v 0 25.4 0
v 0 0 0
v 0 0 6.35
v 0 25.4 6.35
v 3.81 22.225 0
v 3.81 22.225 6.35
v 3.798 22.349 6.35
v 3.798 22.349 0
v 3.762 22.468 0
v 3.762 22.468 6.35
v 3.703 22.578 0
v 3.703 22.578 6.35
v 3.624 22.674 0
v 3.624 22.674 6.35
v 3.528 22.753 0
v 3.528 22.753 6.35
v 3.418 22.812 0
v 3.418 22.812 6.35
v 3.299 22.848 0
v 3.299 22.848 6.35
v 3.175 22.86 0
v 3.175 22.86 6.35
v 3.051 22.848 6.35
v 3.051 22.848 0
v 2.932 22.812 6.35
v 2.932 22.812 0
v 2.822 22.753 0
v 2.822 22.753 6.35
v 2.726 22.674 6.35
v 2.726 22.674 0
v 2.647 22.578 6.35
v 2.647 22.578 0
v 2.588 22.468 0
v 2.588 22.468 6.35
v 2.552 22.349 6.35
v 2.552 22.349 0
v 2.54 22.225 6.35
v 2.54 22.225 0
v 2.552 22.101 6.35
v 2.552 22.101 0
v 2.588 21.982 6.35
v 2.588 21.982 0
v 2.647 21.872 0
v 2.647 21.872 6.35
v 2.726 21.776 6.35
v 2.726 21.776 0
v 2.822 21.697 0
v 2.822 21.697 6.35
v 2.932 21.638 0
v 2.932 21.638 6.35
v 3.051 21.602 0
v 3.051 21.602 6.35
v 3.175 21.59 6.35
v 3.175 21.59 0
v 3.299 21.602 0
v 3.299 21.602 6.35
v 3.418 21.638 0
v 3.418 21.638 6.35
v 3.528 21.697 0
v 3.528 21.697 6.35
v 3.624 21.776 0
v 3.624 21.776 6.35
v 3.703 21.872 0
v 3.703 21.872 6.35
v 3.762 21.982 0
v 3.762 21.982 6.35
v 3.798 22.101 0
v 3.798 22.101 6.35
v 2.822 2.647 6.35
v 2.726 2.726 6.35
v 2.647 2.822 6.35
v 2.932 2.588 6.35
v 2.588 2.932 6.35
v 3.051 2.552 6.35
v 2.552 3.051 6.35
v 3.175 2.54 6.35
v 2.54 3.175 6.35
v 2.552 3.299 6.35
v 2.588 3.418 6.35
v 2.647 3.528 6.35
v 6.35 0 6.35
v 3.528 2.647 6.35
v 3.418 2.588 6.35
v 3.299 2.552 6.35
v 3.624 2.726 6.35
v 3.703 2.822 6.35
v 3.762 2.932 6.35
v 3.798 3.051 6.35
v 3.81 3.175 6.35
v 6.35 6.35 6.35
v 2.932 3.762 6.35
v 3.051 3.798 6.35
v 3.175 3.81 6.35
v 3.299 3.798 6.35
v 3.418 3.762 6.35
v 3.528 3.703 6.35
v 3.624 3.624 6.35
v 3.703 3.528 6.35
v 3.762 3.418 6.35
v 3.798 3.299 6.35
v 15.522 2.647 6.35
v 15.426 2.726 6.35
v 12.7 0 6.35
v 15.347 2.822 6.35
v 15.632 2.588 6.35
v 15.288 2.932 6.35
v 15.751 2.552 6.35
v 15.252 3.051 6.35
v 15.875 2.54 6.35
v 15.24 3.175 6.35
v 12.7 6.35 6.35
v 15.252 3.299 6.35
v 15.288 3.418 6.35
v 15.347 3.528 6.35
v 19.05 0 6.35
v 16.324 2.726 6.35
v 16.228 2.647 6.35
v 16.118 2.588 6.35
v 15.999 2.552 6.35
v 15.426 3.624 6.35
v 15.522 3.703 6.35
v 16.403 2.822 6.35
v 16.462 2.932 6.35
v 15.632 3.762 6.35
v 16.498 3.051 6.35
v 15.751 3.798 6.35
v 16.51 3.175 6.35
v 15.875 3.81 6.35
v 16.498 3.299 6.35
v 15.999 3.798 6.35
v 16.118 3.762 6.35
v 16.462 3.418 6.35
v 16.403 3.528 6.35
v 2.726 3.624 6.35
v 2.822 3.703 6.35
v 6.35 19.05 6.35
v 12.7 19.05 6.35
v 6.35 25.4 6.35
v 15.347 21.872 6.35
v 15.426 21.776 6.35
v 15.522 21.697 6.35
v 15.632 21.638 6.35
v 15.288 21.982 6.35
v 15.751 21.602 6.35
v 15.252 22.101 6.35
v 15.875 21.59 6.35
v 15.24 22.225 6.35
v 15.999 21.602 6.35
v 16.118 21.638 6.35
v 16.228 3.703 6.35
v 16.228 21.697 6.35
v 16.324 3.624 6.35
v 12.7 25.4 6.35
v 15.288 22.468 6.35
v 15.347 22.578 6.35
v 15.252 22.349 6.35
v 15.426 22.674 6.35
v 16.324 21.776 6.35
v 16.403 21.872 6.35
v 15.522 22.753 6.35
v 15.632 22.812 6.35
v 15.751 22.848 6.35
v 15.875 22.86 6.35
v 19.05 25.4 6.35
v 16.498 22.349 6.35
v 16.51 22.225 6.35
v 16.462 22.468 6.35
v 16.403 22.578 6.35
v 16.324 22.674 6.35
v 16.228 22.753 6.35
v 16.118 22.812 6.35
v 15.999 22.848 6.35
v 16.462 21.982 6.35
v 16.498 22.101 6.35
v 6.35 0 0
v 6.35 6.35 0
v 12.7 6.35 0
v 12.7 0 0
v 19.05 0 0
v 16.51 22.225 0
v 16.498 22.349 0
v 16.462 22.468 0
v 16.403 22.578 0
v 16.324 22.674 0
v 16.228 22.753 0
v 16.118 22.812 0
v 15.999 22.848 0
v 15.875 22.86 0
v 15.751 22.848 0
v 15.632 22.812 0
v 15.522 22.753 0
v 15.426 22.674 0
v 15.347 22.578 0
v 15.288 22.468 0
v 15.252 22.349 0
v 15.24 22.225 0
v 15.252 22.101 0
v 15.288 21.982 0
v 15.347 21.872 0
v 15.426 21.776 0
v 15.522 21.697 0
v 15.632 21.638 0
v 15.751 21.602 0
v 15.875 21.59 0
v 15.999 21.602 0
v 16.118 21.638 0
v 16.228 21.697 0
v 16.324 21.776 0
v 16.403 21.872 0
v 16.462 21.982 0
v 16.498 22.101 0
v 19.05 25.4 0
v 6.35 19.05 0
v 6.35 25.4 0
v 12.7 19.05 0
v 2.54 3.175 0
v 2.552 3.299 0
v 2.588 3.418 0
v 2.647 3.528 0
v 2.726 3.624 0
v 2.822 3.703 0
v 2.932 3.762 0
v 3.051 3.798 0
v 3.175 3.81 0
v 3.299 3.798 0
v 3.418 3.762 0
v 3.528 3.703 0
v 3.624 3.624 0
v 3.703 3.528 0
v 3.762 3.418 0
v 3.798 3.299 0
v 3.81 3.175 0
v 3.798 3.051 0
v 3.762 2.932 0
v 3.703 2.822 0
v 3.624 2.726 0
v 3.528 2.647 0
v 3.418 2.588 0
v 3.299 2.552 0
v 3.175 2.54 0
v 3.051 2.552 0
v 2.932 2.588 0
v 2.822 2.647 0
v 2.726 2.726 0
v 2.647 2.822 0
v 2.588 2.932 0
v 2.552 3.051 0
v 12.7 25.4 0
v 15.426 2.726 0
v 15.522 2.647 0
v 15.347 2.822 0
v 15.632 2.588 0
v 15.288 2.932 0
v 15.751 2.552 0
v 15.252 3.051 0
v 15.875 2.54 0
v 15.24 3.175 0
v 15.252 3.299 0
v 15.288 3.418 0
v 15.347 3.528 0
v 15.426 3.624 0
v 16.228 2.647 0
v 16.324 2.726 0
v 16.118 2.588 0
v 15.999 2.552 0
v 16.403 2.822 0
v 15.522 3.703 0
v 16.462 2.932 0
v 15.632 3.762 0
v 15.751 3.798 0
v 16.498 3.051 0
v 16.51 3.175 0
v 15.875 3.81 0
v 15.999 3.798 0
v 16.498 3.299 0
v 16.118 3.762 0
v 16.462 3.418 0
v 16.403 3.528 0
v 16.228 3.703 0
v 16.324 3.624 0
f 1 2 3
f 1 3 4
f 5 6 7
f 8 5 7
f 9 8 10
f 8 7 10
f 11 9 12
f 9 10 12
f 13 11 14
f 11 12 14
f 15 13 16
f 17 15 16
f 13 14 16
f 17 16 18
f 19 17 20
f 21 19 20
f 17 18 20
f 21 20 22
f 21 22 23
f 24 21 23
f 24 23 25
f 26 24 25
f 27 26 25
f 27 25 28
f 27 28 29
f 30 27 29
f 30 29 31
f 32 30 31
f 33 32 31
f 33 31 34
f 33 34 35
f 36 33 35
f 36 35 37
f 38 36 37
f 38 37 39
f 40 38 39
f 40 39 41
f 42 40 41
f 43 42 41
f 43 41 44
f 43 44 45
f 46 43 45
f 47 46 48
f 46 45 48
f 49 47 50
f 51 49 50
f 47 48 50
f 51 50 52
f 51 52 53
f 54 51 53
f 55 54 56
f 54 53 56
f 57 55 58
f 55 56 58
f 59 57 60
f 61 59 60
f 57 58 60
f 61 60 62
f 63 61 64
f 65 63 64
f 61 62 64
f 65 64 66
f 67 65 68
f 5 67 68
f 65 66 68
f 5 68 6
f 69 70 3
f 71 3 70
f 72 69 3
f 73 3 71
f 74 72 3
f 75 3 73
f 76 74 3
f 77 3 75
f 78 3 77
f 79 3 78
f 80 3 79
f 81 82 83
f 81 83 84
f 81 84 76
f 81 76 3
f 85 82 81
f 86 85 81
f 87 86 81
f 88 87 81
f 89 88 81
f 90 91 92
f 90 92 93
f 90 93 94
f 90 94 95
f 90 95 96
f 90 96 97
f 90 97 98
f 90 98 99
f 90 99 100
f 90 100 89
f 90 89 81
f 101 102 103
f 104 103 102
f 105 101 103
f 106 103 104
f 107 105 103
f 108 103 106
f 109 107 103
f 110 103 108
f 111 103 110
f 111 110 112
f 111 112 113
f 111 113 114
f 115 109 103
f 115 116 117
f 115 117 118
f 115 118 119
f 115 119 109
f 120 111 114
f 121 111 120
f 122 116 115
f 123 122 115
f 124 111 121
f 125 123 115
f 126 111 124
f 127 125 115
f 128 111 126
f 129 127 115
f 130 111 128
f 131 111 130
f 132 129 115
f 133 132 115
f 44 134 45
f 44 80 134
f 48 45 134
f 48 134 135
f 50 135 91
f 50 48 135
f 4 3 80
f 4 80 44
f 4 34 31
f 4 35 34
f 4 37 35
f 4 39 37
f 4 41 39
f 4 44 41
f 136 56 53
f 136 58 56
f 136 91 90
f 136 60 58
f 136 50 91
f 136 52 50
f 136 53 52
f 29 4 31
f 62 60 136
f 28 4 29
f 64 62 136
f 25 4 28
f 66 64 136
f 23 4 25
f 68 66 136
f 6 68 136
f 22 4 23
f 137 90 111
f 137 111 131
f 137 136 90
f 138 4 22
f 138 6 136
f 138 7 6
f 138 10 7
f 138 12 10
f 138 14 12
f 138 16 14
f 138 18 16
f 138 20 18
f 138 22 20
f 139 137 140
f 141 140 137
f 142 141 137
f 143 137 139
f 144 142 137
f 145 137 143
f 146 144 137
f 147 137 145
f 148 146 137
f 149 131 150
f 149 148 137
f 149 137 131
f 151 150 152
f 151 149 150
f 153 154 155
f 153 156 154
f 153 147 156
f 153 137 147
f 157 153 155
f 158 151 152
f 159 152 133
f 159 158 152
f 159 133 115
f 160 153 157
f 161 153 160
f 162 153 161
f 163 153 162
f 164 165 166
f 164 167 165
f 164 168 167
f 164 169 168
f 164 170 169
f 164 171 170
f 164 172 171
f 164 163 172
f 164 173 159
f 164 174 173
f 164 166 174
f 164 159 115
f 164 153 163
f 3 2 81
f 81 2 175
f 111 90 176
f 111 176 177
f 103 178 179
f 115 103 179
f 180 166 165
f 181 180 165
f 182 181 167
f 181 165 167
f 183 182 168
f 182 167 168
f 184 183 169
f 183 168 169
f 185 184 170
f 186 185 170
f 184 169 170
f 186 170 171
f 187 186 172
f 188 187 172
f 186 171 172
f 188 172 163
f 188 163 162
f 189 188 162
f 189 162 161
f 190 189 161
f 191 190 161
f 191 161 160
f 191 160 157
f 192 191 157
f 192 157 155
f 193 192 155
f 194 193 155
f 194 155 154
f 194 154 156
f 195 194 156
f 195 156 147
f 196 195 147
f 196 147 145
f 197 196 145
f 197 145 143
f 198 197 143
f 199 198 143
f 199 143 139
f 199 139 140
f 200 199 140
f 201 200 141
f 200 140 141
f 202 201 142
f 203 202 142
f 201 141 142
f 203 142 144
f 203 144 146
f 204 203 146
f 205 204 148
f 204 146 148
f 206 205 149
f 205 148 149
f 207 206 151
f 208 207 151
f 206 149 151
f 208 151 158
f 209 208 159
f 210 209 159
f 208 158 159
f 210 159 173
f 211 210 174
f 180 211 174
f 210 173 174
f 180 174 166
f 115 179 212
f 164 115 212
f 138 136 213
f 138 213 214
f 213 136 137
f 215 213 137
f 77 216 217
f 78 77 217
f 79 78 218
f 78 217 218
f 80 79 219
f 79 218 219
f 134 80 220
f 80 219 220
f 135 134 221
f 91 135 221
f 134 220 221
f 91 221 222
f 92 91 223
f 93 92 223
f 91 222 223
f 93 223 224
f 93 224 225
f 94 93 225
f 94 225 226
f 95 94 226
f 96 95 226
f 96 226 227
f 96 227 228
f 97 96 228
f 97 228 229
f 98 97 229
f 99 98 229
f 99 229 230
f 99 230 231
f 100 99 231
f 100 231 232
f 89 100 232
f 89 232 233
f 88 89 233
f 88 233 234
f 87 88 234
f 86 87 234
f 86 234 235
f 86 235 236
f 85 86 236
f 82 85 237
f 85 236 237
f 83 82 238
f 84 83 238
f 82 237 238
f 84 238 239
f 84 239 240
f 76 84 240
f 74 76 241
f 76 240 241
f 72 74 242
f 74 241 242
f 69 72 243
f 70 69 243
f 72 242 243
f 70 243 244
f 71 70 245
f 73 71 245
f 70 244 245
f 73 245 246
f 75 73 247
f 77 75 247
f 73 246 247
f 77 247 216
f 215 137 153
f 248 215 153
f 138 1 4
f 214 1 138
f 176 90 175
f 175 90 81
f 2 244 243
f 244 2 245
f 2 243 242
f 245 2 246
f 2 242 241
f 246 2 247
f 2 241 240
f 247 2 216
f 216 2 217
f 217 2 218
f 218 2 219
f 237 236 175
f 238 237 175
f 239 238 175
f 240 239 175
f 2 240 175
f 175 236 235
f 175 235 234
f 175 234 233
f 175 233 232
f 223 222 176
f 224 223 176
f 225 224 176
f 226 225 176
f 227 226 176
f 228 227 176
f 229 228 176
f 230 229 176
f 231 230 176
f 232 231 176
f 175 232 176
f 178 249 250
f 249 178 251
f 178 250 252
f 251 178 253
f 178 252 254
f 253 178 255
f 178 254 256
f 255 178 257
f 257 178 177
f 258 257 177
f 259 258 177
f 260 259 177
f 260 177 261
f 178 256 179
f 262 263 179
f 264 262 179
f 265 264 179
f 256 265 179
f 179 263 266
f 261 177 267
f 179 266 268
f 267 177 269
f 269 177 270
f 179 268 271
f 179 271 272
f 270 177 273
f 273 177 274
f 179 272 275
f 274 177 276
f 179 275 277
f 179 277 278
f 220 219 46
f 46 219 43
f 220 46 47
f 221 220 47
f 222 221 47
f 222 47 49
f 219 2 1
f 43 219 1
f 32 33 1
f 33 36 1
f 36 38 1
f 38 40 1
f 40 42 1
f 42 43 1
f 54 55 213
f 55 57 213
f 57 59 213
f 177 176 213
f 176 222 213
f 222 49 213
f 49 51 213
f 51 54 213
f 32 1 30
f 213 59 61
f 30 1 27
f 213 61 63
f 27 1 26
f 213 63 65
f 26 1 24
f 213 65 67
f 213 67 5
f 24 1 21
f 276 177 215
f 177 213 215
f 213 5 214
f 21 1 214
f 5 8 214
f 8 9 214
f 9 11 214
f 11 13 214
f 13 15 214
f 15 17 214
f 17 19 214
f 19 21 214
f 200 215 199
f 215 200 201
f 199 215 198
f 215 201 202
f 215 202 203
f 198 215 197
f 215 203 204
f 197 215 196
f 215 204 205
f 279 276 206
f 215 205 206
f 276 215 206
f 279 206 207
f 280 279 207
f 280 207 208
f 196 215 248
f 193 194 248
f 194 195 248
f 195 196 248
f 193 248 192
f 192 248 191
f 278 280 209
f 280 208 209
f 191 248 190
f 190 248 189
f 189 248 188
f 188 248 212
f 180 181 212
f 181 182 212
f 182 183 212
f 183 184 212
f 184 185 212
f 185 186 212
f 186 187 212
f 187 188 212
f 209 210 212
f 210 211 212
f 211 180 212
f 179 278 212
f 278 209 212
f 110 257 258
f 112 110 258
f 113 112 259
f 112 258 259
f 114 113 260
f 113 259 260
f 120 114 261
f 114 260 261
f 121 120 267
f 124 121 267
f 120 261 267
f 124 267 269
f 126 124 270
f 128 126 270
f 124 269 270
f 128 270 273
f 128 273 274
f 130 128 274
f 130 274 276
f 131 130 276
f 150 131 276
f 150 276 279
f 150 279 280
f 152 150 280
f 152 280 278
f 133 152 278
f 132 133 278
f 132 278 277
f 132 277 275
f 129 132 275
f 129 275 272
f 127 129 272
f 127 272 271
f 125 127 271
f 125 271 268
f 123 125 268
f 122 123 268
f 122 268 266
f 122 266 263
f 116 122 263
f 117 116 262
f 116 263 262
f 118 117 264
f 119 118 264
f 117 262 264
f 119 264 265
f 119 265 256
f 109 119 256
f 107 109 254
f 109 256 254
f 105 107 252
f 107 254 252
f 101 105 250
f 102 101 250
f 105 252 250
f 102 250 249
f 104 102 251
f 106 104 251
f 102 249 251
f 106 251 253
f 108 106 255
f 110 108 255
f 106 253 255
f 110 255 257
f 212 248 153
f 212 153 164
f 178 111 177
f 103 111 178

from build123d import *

# Parameters (mm, degrees)
SKETCH1_W           = 19.05
SKETCH1_H           = 25.4
BOSS_EXTRUDE1_DEPTH = 6.35
SKETCH2_W           = 6.35
SKETCH2_H           = 6.35
CUT_EXTRUDE1_DEPTH  = 7.35
SKETCH6_R           = 0.635
CUT_EXTRUDE2_DEPTH  = 7.35
SKETCH7_R           = 0.635
CUT_EXTRUDE3_DEPTH  = 7.35


with BuildPart() as part:
    # Sketch1 → Boss-Extrude1 (new body)
    with BuildSketch(Plane.XY):
        with Locations((9.525, 12.7)):
            Rectangle(SKETCH1_W, SKETCH1_H)
    extrude(amount=BOSS_EXTRUDE1_DEPTH)

    # Sketch2 → Cut-Extrude1 (cut, through all)
    with BuildSketch(Plane.XY.offset(6.35)):
        with Locations((9.525, 22.225)):
            Rectangle(SKETCH2_W, SKETCH2_H)
    cut_extrude1 = extrude(amount=-CUT_EXTRUDE1_DEPTH, mode=Mode.SUBTRACT)

    # Mirror1: Cut-Extrude1 across plane
    add(cut_extrude1.mirror(Plane.ZX.offset(12.7)), mode=Mode.SUBTRACT)

    # Sketch6 → Cut-Extrude2 (cut, through all)
    with BuildSketch(Plane.XY.offset(6.35)):
        with Locations((3.175, 22.225)):
            Circle(SKETCH6_R)
        with Locations((15.875, 22.225)):
            Circle(SKETCH6_R)
    extrude(amount=-CUT_EXTRUDE2_DEPTH, mode=Mode.SUBTRACT)

    # Sketch7 → Cut-Extrude3 (cut, through all)
    with BuildSketch(Plane(origin=(0, 0, 0), x_dir=(-1, 0, 0), z_dir=(0, 0, -1))):
        with Locations((-15.875, 3.175)):
            Circle(SKETCH7_R)
        with Locations((-3.175, 3.175)):
            Circle(SKETCH7_R)
    extrude(amount=-CUT_EXTRUDE3_DEPTH, mode=Mode.SUBTRACT)


solid = part.part
